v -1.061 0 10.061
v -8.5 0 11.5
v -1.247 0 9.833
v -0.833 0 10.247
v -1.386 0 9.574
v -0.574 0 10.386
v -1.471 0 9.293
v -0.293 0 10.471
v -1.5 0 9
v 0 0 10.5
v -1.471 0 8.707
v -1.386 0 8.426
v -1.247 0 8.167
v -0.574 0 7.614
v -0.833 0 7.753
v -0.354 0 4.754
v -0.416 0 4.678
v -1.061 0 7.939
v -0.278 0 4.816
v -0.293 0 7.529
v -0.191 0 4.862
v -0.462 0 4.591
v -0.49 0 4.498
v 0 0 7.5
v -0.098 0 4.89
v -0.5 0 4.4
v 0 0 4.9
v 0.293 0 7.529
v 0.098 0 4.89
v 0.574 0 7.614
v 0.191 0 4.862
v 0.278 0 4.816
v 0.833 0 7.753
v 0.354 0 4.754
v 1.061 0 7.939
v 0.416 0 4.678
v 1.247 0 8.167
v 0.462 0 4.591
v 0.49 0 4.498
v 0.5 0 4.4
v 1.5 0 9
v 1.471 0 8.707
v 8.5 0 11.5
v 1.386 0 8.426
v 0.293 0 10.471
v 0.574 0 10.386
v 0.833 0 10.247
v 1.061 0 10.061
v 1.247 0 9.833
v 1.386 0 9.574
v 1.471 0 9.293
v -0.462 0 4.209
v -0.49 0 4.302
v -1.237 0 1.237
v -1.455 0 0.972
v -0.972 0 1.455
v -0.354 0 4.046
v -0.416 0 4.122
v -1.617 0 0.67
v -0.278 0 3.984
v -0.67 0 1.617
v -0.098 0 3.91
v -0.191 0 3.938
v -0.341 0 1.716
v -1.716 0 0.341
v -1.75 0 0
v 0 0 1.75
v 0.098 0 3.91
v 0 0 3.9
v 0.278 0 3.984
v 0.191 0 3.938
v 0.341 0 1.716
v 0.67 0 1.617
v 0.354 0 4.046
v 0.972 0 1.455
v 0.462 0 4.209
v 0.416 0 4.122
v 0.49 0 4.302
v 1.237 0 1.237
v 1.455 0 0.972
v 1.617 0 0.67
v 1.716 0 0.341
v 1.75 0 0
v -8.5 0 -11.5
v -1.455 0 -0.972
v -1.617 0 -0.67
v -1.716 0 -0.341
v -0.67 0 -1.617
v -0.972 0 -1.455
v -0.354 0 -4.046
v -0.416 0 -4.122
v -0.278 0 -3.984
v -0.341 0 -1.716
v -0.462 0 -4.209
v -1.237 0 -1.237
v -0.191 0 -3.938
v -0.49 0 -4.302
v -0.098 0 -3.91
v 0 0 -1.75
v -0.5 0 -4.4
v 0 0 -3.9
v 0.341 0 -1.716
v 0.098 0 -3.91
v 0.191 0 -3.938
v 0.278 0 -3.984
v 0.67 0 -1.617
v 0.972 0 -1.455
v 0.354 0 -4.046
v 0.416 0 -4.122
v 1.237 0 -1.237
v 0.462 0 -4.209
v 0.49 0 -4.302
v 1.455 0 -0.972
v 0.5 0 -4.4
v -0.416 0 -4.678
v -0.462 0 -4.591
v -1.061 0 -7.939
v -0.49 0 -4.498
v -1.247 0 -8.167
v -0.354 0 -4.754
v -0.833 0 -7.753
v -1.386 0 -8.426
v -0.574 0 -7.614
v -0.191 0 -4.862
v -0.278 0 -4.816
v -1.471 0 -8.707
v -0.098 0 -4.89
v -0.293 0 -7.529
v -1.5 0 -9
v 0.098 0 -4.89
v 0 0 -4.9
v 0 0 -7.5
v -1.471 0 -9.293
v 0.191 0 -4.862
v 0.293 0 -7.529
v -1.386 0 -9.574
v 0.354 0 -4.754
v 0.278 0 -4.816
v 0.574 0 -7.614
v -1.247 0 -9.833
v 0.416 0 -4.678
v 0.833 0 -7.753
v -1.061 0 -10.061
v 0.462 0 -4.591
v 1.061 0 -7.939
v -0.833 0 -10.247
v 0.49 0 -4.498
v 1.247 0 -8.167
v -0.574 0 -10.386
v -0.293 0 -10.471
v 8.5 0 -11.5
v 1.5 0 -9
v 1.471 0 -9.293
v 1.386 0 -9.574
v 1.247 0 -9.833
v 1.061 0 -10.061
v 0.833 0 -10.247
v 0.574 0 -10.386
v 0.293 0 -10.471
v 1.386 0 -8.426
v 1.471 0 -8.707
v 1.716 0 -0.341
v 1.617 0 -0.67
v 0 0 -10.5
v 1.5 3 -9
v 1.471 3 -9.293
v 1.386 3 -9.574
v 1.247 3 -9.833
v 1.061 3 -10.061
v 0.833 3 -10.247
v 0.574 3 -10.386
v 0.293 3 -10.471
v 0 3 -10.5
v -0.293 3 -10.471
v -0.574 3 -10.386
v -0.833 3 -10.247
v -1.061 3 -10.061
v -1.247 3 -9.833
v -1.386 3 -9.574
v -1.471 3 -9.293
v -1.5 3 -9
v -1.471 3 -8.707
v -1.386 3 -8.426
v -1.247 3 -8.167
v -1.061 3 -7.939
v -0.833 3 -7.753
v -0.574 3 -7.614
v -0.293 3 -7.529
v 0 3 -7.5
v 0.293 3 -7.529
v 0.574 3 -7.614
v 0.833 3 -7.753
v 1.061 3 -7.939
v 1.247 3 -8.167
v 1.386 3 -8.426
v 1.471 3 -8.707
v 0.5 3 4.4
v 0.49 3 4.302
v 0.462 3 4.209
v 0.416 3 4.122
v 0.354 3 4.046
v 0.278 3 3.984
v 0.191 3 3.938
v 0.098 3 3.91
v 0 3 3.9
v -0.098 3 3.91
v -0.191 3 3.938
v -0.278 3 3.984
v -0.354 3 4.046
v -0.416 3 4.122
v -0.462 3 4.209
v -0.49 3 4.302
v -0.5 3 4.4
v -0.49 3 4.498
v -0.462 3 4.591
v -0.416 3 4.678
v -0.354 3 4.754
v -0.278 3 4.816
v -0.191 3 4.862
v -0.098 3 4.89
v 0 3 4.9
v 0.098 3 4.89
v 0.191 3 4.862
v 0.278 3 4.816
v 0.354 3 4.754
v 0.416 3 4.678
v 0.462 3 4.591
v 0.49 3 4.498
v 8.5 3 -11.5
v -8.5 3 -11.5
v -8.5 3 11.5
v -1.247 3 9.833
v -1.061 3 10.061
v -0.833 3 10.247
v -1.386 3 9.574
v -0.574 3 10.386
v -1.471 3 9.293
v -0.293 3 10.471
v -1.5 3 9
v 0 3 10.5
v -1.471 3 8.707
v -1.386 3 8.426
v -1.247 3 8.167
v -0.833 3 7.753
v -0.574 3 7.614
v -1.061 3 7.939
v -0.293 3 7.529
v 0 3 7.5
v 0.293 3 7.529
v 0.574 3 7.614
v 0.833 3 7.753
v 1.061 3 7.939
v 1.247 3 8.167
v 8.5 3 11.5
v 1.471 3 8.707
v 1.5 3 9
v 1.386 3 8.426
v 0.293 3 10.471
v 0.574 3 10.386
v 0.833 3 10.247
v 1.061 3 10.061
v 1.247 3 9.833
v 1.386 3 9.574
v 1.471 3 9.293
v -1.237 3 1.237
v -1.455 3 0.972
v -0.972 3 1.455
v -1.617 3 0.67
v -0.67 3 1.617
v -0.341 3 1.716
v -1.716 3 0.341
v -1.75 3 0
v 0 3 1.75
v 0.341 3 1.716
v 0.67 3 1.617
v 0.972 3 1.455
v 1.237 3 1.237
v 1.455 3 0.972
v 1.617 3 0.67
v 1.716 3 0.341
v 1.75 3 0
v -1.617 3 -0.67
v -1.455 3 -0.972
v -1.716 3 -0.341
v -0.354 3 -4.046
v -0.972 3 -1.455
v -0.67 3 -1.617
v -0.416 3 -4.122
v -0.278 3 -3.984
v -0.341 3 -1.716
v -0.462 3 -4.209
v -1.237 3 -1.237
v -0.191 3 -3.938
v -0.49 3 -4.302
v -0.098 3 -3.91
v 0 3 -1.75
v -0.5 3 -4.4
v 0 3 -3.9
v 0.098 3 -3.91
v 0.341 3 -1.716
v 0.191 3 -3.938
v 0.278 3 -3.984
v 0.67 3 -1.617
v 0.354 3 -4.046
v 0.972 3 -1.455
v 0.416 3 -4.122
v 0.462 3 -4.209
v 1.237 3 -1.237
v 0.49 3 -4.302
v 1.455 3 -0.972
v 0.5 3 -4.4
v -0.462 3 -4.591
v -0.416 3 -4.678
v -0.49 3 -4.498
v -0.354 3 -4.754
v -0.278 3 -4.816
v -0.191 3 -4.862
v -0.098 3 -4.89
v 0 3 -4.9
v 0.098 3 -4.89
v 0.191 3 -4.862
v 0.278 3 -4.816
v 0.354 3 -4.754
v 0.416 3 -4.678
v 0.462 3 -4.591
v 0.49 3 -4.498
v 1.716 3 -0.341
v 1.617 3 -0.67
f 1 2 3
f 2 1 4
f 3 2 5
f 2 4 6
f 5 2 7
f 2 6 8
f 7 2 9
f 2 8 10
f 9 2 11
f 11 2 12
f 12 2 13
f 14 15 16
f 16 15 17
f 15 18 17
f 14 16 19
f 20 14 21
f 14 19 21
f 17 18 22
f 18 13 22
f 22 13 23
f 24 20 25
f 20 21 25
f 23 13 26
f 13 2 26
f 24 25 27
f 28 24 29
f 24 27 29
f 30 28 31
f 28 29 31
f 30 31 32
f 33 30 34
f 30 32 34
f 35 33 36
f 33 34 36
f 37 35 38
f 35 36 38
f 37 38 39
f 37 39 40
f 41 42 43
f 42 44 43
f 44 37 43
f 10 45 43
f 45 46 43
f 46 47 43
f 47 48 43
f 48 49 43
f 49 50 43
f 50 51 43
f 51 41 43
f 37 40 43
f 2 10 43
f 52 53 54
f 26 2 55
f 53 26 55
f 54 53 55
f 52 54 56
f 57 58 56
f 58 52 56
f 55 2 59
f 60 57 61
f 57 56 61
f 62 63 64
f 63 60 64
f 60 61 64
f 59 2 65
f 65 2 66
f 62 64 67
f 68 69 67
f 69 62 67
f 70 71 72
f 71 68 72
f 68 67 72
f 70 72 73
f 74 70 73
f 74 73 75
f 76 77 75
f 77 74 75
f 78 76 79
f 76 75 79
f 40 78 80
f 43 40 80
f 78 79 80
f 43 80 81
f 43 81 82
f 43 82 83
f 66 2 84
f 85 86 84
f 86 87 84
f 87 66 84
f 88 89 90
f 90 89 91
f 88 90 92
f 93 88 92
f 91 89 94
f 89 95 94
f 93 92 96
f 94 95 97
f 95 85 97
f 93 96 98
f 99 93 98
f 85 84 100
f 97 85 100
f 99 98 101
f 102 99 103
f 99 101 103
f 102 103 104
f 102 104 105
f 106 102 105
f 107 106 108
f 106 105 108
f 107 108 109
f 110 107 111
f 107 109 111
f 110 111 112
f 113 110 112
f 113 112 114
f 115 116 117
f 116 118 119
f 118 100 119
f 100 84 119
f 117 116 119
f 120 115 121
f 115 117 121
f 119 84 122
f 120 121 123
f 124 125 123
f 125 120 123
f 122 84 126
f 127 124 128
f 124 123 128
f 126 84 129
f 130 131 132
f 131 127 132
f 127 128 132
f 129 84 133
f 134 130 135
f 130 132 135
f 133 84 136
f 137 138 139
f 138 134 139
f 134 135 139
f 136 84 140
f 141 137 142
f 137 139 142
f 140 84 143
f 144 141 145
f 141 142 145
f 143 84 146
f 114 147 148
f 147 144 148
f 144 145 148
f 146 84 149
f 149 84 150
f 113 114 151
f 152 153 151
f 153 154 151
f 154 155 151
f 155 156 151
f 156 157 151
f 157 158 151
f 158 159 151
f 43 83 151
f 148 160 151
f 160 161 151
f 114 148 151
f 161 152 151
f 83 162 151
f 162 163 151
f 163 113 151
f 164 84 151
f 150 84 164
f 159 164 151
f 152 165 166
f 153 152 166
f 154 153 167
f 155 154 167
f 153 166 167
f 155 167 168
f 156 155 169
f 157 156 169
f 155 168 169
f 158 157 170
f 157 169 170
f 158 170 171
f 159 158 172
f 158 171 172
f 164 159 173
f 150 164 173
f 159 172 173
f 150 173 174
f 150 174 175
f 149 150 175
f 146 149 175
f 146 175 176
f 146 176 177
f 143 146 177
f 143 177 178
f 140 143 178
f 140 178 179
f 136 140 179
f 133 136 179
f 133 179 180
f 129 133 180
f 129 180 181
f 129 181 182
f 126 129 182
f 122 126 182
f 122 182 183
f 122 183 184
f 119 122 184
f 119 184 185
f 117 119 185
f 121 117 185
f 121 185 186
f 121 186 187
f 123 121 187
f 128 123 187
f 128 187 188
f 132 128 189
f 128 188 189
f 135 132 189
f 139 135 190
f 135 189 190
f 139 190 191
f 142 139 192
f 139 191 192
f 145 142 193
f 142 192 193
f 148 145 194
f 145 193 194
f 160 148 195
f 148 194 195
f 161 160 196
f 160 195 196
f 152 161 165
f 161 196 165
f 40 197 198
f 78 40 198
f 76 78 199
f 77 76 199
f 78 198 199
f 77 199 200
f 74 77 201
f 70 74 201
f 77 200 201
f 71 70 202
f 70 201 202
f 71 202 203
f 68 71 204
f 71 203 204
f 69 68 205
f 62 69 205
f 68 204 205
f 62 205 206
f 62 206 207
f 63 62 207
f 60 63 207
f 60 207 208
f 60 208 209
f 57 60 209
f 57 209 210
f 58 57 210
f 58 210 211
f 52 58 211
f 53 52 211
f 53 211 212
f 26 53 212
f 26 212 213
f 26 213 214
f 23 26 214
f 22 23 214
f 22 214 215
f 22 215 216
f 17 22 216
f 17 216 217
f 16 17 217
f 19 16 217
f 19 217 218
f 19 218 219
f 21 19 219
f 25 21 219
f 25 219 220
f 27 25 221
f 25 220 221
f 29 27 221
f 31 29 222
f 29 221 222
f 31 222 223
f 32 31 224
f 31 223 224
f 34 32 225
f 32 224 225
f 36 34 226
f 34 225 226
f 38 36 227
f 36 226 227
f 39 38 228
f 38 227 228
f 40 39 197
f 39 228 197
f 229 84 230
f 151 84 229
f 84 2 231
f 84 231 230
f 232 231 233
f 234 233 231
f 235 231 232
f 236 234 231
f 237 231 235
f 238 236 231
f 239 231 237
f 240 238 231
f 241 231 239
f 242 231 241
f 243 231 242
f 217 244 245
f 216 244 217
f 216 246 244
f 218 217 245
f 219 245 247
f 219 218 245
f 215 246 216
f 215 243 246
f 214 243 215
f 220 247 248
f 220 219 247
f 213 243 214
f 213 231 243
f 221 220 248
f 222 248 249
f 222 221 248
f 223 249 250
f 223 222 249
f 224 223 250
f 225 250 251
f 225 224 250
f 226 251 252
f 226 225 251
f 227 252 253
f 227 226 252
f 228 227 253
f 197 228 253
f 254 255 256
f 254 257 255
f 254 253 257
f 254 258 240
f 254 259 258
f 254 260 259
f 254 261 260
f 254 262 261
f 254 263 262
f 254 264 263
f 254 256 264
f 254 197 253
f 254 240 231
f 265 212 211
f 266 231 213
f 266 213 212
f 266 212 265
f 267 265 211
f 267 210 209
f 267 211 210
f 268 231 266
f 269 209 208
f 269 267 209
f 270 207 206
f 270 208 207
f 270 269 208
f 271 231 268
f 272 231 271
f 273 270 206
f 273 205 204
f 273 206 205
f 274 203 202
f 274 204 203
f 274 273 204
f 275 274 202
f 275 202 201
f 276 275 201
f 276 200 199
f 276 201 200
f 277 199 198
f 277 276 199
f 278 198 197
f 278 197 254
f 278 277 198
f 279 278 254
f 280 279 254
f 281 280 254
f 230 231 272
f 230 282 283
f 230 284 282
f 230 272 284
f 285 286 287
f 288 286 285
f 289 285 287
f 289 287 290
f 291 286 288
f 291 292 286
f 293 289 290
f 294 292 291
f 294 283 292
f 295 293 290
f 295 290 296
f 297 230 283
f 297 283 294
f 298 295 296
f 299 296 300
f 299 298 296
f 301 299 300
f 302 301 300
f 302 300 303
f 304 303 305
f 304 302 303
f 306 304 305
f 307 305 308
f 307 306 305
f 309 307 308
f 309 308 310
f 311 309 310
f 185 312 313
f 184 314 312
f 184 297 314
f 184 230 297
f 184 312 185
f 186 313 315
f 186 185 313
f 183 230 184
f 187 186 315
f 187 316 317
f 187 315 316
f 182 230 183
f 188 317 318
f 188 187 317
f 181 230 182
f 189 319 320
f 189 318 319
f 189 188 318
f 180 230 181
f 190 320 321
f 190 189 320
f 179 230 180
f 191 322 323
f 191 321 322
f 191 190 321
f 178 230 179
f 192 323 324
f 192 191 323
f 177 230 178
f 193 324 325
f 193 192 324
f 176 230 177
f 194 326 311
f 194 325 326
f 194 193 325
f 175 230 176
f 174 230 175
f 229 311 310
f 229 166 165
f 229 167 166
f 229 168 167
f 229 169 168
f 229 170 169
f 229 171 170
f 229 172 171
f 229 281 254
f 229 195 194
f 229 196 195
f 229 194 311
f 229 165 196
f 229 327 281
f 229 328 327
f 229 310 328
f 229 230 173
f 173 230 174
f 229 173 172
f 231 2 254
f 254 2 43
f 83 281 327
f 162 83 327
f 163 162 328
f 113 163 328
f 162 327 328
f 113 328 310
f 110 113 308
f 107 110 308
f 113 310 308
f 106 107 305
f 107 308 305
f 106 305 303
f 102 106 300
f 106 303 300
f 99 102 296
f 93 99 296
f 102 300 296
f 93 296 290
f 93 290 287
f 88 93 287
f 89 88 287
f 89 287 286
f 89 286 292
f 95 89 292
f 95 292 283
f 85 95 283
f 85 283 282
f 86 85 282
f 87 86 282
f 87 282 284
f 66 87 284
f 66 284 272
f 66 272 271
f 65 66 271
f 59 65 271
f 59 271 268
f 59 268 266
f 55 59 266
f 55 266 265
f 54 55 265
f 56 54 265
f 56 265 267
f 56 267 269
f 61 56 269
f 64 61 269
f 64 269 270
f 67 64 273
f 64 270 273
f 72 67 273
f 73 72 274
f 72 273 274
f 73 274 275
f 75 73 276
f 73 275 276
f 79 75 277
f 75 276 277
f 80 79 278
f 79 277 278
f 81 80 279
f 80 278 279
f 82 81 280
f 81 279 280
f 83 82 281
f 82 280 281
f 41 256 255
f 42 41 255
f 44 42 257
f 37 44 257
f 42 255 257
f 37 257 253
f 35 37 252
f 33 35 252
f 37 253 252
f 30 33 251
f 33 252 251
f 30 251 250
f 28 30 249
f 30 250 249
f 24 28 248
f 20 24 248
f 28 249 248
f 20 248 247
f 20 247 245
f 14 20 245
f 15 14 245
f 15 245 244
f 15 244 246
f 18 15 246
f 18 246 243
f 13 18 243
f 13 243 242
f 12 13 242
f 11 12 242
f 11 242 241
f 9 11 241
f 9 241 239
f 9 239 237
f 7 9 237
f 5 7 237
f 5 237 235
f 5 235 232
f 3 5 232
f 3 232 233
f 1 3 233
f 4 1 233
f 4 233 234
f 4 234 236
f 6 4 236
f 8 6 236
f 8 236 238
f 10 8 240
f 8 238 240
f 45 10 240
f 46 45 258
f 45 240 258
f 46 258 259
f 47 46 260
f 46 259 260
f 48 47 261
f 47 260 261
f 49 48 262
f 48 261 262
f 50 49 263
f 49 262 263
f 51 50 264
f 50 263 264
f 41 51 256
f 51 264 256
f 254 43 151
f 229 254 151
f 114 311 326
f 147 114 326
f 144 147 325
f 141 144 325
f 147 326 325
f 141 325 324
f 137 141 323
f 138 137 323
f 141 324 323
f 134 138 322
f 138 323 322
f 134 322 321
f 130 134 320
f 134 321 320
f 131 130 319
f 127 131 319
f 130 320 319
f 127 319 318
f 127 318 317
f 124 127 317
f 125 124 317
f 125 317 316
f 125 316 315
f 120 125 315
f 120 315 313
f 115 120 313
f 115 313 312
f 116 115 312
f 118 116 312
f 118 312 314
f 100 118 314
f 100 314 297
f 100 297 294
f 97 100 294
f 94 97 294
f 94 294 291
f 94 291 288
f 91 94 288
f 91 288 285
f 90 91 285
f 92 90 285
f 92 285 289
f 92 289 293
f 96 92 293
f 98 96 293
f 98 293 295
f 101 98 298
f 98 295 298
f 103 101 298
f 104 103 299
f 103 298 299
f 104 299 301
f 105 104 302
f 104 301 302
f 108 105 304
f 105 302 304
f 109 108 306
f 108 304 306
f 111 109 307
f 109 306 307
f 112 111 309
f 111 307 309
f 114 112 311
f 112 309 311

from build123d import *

# Parameters (mm, degrees)
SKETCH1_W           = 17
SKETCH1_H           = 23
BOSS_EXTRUDE1_DEPTH = 3
SKETCH2_R           = 1.5
SKETCH2_R_2         = 0.5
CUT_EXTRUDE1_DEPTH  = 4
SKETCH3_R           = 1.75
CUT_EXTRUDE2_DEPTH  = 4


with BuildPart() as part:
    # Sketch1 → Boss-Extrude1 (new body)
    with BuildSketch(Plane(origin=(0, 0, 0), x_dir=(1, 0, 0), z_dir=(0, 1, 0))):
        Rectangle(SKETCH1_W, SKETCH1_H)
    extrude(amount=BOSS_EXTRUDE1_DEPTH)

    # Sketch2 → Cut-Extrude1 (cut, through all)
    with BuildSketch(Plane(origin=(0, 3, 0), x_dir=(1, 0, 0), z_dir=(0, 1, 0))):
        with Locations((0, 9)):
            Circle(SKETCH2_R)
        with Locations((0, 4.4)):
            Circle(SKETCH2_R_2)
        with Locations((0, -4.4)):
            Circle(SKETCH2_R_2)
        with Locations((0, -9)):
            Circle(SKETCH2_R)
    extrude(amount=-CUT_EXTRUDE1_DEPTH, mode=Mode.SUBTRACT)

    # Sketch3 → Cut-Extrude2 (cut, through all)
    with BuildSketch(Plane(origin=(0, 3, 0), x_dir=(1, 0, 0), z_dir=(0, 1, 0))):
        Circle(SKETCH3_R)
    extrude(amount=-CUT_EXTRUDE2_DEPTH, mode=Mode.SUBTRACT)


solid = part.part
